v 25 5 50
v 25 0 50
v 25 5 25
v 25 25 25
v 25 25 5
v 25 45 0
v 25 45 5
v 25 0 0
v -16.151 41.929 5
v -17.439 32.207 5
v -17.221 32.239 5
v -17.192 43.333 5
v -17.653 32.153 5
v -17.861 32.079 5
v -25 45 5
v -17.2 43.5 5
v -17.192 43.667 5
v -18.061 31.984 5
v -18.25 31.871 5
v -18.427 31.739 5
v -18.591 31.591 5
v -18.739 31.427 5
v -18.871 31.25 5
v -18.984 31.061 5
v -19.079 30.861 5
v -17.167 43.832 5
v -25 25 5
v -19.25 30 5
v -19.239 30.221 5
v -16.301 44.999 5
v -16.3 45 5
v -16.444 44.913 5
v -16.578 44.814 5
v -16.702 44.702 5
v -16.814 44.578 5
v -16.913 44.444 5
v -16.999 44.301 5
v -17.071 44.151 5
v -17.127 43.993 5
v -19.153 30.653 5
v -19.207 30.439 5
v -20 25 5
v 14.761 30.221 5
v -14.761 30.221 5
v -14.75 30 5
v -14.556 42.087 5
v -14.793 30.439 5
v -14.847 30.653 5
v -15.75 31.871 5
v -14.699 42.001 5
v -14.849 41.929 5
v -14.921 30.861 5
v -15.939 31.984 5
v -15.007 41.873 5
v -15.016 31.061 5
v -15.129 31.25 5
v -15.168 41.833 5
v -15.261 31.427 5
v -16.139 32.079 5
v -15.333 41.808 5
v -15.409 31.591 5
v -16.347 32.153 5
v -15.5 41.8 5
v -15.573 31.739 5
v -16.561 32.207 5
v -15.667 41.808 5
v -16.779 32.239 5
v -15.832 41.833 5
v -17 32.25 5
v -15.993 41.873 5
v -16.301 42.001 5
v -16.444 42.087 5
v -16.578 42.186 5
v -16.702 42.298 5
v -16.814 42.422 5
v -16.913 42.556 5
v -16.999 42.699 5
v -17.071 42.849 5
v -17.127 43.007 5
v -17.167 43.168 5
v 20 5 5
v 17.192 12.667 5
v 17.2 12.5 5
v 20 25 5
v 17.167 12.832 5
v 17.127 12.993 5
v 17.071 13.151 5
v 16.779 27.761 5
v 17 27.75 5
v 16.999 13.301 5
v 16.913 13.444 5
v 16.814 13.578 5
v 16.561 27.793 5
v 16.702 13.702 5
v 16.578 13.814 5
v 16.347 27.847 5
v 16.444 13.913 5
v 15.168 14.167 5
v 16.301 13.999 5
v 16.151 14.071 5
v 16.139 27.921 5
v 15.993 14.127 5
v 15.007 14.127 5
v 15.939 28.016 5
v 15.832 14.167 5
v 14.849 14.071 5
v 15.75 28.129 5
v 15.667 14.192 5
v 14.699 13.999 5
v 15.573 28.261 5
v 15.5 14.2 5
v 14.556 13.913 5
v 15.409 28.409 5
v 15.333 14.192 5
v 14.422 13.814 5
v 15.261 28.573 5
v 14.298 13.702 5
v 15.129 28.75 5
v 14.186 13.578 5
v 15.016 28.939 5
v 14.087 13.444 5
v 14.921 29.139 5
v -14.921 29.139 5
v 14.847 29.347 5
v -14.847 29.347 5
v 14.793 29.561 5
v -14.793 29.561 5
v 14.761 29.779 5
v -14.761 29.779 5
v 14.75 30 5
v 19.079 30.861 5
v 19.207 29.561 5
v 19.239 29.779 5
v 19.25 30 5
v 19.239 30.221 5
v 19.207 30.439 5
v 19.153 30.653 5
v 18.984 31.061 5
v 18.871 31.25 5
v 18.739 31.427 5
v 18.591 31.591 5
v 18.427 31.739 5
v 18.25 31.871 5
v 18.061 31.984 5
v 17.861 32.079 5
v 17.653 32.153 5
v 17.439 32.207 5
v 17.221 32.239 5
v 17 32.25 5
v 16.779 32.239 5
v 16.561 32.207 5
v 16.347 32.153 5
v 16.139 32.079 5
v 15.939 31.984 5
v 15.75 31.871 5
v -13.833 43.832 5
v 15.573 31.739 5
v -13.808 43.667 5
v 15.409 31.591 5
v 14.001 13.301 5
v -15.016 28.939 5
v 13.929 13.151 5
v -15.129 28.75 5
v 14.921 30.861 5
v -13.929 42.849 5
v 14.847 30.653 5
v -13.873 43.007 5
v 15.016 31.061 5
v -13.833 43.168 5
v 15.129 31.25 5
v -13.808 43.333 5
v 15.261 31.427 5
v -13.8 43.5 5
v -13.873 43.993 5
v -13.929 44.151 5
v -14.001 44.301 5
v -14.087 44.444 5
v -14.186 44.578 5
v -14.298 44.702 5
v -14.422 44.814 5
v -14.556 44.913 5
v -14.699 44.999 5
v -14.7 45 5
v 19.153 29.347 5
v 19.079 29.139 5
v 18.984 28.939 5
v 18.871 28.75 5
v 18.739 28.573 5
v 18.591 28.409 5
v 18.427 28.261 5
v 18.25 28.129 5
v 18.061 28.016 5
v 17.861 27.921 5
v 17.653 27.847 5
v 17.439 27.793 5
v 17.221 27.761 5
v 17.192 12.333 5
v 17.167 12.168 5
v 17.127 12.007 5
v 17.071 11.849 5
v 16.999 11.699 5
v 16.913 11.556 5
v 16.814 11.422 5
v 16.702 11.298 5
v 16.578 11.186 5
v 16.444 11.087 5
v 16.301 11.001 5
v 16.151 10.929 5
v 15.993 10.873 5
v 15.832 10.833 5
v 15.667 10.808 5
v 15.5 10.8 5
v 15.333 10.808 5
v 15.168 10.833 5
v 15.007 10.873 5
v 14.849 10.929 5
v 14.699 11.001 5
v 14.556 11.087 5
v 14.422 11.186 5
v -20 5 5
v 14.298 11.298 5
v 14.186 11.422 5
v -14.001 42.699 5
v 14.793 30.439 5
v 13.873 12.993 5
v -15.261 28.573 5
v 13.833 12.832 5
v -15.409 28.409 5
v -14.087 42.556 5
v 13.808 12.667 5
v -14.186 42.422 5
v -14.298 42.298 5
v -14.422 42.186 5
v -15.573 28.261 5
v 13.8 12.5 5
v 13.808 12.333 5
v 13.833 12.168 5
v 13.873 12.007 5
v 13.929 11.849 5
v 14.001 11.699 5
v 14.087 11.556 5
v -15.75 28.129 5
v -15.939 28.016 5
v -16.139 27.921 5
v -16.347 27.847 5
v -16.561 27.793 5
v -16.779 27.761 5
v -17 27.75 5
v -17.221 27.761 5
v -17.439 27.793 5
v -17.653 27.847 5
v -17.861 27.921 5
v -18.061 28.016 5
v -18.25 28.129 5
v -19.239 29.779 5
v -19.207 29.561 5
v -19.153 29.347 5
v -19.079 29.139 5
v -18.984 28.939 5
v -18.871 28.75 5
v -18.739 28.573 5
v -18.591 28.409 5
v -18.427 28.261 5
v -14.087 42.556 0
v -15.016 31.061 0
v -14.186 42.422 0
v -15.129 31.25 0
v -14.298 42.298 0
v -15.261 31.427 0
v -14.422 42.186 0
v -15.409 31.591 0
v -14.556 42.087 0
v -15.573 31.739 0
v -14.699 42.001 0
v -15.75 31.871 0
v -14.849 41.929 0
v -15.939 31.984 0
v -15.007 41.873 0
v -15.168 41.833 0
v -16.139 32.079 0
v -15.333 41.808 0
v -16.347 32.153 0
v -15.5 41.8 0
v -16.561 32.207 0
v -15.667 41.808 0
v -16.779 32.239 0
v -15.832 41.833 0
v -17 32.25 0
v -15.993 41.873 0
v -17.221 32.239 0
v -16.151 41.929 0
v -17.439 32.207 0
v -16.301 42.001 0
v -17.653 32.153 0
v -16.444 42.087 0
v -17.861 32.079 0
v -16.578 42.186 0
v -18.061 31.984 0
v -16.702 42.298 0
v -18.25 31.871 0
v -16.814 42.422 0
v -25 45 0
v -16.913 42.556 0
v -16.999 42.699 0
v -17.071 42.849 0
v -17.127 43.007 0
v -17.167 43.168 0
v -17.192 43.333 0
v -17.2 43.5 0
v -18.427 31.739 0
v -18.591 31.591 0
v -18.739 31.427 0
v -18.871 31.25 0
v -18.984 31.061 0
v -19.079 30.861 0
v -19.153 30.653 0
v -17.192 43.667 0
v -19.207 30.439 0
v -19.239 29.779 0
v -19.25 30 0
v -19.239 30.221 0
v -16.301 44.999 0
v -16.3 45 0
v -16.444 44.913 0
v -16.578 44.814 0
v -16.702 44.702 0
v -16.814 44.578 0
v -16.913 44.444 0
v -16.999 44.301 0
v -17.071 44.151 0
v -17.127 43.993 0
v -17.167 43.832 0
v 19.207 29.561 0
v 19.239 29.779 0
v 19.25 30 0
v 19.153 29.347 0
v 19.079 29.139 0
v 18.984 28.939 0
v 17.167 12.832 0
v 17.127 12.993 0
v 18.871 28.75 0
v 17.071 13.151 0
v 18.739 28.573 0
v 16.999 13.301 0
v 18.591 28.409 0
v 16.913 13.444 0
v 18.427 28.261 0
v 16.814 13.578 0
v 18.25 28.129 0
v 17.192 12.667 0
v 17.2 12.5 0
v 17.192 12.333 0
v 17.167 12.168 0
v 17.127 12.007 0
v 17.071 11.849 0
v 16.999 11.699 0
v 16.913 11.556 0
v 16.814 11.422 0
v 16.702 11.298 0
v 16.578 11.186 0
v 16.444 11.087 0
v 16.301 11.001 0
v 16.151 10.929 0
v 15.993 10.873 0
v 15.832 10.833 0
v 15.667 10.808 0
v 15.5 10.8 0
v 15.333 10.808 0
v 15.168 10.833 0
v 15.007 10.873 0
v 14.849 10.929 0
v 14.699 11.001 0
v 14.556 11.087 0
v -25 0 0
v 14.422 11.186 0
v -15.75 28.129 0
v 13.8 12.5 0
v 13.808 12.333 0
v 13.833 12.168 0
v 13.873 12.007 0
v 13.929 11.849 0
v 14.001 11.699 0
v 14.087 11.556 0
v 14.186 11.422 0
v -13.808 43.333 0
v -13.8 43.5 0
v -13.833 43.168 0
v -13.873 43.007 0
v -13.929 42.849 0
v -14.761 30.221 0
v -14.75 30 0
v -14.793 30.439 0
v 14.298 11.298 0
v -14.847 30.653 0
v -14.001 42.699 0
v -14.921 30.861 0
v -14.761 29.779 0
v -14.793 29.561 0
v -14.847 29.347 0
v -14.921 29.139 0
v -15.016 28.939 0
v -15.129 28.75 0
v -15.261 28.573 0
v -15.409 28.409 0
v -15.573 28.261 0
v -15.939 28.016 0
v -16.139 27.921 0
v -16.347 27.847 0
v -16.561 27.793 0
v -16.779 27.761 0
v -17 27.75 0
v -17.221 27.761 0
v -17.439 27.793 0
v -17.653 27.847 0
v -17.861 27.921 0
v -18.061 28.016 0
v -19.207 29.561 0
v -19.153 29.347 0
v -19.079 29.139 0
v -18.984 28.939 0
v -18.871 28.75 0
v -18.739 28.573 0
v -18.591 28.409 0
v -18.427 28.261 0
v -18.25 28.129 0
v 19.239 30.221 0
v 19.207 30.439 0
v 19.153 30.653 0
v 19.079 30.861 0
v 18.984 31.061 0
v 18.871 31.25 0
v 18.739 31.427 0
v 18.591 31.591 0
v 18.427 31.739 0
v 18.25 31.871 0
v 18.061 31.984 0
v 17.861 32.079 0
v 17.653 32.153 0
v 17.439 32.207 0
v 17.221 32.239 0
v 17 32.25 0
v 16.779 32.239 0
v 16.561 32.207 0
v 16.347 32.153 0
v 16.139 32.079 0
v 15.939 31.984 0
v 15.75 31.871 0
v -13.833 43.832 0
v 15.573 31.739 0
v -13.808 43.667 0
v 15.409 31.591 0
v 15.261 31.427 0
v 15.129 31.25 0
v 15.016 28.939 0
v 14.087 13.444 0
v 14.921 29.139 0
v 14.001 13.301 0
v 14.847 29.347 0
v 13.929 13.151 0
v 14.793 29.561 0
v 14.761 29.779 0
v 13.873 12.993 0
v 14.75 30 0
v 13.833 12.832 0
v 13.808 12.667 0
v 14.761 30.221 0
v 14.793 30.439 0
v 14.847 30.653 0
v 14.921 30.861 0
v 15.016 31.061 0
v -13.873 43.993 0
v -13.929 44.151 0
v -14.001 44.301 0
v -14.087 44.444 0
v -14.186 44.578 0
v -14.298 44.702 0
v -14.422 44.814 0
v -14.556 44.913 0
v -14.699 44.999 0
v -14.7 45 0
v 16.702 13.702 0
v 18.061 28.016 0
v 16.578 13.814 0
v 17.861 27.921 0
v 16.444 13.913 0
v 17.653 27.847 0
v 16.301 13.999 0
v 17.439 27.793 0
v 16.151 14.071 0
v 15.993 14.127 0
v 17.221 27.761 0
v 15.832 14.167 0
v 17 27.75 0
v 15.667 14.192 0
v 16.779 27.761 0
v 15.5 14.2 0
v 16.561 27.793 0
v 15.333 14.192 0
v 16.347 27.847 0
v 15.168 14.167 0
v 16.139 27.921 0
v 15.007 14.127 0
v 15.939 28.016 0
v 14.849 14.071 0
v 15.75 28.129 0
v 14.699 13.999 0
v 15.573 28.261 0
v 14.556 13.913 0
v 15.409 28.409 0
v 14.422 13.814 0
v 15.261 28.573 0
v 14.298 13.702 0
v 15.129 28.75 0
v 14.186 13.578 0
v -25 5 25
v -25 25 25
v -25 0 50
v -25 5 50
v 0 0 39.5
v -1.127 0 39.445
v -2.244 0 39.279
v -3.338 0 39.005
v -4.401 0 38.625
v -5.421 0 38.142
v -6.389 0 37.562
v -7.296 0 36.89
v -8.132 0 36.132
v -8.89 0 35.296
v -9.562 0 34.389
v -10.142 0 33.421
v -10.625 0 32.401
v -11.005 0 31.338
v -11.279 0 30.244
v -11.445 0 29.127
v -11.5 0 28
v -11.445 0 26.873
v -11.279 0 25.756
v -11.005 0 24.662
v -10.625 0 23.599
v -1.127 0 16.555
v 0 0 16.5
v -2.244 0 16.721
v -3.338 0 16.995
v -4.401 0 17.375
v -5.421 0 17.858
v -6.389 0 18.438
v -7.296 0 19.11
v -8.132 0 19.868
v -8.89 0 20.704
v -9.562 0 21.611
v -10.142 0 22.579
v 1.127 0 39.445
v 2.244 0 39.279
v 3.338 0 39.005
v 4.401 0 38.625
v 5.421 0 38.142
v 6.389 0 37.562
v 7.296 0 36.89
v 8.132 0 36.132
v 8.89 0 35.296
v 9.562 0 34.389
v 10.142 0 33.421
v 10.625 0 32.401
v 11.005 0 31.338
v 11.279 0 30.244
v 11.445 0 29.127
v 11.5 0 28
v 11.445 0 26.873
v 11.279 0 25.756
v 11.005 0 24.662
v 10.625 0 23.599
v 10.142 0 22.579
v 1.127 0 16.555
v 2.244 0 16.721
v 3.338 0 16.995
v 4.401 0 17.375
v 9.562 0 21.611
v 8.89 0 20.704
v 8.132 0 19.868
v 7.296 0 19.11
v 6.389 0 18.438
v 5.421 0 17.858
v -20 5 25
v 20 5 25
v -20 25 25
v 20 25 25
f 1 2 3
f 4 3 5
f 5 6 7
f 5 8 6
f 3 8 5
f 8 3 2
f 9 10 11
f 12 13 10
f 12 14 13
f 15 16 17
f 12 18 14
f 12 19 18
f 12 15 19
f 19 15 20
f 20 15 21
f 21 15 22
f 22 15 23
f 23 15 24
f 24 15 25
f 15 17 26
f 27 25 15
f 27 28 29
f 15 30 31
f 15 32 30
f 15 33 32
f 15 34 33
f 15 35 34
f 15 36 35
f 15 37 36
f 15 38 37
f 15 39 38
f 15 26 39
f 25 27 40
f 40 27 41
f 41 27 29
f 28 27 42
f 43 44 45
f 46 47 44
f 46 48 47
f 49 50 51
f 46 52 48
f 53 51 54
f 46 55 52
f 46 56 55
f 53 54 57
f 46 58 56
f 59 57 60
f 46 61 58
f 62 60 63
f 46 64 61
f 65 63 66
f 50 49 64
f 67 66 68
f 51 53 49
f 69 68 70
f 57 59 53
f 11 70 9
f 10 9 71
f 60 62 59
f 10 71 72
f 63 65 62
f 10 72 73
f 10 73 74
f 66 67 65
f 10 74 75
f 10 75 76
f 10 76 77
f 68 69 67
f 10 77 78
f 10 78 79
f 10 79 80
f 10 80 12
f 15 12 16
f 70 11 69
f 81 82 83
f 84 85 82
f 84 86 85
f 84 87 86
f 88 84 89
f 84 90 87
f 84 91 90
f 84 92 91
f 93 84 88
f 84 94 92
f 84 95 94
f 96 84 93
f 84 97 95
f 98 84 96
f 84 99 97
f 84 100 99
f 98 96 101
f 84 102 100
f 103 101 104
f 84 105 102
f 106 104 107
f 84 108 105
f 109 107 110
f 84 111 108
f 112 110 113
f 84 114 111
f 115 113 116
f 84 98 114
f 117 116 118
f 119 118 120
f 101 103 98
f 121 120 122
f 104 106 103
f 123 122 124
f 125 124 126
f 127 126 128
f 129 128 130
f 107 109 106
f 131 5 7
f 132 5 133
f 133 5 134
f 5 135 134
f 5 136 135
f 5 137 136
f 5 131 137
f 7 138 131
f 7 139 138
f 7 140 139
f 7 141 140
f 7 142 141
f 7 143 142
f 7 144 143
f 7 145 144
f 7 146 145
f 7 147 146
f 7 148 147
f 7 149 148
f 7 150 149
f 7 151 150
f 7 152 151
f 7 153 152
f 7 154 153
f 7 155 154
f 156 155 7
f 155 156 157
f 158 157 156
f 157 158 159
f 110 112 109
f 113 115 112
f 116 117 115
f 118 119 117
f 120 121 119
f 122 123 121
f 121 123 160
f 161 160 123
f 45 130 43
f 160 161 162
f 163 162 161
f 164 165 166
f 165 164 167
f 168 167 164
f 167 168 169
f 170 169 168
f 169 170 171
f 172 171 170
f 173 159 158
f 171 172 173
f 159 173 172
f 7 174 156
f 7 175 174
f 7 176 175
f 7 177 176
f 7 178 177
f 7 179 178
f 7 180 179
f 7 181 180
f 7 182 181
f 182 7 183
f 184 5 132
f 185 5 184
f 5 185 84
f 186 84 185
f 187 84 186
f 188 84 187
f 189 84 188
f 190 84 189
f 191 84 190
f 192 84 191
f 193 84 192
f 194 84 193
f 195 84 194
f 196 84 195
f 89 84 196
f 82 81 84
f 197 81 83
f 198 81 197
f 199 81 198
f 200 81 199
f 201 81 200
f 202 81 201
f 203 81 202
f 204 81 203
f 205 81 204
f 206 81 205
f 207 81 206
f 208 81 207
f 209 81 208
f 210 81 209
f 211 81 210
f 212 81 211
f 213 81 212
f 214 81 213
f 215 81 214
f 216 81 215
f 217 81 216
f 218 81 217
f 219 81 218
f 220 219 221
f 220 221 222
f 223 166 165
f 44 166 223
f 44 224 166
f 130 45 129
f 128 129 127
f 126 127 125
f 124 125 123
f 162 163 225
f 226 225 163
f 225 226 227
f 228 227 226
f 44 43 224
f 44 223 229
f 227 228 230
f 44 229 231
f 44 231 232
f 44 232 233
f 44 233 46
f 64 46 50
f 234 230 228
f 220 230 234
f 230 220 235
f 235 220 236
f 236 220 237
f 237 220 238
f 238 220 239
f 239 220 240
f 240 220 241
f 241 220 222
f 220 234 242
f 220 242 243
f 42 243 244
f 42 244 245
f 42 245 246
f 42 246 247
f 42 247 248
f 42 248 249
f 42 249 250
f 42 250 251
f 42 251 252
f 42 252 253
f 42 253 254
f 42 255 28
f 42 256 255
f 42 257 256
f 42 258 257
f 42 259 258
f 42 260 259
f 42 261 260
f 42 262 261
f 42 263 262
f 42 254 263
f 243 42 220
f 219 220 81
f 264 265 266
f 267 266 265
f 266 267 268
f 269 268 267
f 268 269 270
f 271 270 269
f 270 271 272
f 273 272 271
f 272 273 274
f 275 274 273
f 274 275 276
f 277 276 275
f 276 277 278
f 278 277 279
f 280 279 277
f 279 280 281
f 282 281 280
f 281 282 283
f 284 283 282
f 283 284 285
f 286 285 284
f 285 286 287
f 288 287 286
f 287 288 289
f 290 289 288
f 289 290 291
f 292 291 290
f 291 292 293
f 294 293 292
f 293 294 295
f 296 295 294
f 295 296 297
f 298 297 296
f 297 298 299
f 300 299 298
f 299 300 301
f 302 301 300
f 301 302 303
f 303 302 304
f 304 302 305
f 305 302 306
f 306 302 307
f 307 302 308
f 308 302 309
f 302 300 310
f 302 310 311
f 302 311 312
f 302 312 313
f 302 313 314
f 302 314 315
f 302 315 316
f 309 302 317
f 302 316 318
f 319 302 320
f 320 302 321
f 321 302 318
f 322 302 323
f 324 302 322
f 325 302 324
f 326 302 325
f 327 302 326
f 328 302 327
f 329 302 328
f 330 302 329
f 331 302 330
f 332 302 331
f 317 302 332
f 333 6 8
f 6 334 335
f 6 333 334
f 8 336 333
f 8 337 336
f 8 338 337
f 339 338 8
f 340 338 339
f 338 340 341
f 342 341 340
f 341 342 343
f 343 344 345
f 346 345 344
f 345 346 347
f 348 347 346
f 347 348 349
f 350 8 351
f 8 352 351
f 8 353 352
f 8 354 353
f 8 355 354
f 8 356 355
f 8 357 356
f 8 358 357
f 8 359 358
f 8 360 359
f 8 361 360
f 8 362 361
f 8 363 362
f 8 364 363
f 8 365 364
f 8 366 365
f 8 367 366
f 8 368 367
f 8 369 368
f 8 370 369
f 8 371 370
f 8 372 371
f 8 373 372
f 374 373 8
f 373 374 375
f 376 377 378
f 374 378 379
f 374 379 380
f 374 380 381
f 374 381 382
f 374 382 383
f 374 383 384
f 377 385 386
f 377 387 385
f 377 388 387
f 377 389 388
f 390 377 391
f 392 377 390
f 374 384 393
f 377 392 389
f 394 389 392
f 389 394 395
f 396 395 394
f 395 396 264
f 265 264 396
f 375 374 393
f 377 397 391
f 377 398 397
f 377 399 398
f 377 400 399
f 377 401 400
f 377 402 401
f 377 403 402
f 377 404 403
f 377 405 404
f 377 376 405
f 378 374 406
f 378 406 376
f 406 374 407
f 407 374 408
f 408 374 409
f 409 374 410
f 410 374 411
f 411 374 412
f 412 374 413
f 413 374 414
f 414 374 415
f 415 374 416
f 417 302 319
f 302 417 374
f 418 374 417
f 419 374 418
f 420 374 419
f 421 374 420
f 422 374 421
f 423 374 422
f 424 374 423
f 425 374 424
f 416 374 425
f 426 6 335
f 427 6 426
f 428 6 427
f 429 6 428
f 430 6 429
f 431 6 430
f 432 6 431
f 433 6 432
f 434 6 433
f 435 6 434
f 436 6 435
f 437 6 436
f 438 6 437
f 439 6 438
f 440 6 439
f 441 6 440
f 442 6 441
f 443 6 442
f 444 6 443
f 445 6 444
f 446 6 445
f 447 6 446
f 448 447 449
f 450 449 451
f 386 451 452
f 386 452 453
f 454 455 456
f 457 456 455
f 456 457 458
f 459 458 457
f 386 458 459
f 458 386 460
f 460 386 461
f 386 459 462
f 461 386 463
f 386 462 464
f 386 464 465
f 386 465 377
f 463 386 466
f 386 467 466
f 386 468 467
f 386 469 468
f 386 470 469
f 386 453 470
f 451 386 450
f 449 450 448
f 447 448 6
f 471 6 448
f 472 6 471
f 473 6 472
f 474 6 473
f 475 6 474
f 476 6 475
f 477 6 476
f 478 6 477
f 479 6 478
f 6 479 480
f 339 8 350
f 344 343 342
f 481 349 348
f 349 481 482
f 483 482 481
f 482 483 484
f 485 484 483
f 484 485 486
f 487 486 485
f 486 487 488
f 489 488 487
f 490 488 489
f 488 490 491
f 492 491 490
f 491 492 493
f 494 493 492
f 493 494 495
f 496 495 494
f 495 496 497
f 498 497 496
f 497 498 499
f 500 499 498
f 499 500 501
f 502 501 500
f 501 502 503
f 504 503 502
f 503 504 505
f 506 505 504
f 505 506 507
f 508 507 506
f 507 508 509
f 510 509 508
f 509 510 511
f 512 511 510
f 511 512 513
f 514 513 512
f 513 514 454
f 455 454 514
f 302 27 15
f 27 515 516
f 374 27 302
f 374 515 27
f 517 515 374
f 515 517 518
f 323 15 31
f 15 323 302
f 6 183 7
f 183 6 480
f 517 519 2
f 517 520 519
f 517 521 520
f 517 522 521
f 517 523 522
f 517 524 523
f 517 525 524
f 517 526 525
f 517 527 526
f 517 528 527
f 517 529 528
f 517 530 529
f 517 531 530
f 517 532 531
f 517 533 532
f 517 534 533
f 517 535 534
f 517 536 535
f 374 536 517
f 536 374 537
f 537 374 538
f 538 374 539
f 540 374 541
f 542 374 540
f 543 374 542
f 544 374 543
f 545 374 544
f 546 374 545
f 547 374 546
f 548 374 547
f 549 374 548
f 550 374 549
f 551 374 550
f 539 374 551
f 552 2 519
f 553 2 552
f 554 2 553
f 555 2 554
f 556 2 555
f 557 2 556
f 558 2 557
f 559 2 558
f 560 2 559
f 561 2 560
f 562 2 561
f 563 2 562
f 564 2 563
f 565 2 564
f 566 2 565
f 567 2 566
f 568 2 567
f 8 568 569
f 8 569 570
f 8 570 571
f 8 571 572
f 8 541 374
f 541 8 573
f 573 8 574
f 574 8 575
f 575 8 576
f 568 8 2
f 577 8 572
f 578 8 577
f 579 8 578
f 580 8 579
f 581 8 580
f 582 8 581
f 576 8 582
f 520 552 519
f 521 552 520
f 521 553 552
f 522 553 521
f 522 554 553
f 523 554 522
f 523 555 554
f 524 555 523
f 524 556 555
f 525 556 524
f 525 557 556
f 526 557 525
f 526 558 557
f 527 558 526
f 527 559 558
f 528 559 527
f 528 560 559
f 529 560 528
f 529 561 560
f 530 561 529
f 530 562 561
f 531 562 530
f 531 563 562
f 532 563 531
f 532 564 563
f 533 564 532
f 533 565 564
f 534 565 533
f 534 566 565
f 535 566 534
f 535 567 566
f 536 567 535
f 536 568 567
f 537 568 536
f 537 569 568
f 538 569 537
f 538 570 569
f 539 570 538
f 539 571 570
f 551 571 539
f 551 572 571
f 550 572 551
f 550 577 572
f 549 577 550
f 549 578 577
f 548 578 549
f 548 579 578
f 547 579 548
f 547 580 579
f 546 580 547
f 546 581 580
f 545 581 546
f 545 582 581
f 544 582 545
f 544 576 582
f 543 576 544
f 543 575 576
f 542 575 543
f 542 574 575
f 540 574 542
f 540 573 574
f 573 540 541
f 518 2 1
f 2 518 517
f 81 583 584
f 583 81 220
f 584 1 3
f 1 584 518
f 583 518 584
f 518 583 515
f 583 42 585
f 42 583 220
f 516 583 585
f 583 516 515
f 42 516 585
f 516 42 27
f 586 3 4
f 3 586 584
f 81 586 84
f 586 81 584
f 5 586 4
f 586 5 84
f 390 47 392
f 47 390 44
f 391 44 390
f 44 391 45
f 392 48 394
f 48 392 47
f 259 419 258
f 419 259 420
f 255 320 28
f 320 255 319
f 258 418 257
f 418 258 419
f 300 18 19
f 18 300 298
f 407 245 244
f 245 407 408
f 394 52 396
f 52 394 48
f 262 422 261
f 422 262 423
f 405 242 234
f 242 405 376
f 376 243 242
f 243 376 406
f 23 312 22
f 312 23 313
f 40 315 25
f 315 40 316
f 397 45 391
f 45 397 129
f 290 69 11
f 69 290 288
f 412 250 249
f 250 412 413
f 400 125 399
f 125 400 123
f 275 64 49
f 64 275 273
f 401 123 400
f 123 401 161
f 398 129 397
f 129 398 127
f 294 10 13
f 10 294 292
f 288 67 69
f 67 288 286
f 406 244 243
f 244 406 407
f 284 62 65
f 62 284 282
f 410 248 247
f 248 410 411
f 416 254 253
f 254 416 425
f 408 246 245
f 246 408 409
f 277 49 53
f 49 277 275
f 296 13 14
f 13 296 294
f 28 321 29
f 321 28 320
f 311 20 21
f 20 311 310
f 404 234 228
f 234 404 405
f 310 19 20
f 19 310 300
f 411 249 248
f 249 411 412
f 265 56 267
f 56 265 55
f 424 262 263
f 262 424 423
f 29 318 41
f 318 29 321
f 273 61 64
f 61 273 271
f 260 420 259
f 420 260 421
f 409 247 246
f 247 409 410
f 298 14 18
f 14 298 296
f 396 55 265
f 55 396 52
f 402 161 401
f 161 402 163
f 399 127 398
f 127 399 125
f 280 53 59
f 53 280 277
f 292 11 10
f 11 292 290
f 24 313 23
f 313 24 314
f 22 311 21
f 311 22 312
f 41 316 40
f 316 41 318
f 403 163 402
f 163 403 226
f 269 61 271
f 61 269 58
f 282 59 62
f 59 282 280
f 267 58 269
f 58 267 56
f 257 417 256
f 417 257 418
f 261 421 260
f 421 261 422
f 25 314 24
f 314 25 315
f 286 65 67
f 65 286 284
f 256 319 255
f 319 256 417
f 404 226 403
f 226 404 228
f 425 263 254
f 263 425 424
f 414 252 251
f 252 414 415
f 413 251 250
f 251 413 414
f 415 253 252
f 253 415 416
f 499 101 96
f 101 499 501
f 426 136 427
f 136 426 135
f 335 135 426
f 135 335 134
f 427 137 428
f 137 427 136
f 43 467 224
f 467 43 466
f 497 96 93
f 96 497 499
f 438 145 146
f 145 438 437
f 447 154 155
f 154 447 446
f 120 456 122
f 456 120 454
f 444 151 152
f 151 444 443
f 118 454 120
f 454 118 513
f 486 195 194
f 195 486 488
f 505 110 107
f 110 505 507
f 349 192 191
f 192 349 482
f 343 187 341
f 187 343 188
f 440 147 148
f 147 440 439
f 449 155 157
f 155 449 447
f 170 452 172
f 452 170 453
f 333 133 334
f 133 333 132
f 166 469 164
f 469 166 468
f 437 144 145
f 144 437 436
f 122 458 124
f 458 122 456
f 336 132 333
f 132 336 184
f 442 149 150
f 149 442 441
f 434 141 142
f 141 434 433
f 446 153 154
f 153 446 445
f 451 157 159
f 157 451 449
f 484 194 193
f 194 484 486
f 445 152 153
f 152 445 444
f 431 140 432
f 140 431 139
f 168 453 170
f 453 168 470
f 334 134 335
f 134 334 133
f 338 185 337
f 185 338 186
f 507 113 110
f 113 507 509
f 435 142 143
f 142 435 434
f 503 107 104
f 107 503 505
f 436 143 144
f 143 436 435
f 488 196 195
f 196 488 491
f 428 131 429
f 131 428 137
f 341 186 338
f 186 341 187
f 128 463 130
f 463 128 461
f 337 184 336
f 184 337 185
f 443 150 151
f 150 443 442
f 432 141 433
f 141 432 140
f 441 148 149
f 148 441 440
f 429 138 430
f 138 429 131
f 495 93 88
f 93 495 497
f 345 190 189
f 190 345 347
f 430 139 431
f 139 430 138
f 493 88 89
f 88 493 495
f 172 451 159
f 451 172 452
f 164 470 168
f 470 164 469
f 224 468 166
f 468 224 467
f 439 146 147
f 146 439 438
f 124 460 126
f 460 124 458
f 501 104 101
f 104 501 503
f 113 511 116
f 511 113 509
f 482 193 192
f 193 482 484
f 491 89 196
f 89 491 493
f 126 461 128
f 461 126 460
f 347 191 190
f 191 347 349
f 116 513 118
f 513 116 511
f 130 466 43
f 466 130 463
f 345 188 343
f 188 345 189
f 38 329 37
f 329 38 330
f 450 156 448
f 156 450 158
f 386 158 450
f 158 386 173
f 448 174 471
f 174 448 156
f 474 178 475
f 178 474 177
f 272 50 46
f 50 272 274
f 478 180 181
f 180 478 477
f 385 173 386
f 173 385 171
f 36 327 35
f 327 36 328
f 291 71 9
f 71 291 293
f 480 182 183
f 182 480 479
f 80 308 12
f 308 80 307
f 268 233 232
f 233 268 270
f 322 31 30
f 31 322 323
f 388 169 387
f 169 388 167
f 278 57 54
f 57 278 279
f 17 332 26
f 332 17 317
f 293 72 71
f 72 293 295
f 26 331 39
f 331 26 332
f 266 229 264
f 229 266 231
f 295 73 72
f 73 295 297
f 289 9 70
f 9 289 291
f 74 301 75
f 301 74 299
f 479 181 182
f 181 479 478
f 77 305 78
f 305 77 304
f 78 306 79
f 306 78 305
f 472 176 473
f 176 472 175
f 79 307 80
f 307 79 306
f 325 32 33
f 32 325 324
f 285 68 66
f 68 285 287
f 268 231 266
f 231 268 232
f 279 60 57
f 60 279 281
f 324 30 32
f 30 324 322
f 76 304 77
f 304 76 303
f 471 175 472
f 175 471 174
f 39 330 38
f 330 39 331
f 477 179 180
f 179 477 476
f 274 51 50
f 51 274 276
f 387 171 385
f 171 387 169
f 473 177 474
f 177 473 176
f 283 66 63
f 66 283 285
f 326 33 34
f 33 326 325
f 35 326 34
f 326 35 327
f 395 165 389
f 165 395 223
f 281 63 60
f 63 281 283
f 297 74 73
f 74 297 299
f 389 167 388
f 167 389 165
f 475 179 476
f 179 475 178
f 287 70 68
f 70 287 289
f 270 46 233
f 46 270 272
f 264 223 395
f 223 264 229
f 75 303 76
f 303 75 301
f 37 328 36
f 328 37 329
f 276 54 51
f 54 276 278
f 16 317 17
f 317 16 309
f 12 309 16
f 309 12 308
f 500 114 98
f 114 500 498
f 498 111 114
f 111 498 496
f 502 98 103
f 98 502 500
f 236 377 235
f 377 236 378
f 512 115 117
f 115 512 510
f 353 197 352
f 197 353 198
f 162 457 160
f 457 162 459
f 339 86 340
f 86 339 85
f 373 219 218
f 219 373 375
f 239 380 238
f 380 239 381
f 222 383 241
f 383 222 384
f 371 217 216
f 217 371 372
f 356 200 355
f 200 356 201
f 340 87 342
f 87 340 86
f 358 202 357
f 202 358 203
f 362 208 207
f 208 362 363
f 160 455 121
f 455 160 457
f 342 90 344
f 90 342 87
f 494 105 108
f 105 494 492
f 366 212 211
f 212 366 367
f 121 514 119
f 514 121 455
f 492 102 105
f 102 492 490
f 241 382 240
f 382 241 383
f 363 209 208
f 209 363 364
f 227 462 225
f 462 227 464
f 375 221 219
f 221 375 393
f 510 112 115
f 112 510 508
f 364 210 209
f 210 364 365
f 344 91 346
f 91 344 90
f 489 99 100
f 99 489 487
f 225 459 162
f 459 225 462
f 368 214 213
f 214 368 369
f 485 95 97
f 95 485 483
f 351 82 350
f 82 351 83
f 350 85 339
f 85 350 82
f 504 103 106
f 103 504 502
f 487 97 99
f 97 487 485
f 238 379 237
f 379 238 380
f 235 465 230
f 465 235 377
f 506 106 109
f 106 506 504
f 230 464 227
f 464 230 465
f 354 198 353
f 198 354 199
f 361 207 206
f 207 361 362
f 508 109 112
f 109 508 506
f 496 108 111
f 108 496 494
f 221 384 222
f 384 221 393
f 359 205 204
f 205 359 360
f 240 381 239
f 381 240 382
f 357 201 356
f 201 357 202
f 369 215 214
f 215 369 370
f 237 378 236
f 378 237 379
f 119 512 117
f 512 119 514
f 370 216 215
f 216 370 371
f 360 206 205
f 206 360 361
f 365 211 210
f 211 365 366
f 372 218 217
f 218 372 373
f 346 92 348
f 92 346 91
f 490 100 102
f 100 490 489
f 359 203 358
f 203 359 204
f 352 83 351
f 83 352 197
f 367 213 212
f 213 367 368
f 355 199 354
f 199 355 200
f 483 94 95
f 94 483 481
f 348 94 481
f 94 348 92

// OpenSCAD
// L-shaped mounting bracket for NEMA 17 stepper motor
// Print orientation: base plate on bed, motor plate builds upward (+Z)

// ---------------- Parameters ----------------
$fn = 64;

// Base plate
base_x0 = -25;   // base plate X start
base_x1 = 25;    // base plate X end
base_y0 = 0;     // base plate Y start
base_y1 = 45;    // base plate Y end
base_z0 = 0;     // base plate Z start
base_z1 = 5;     // base plate Z end
mount_hole_d = 4.5;  // M4 through-holes diameter
mount_hole_x = [-17, 17]; // through-hole X positions
mount_hole_y = 30;      // through-hole Y position

// Motor plate
motor_x0 = -25;  // motor plate X start
motor_x1 = 25;   // motor plate X end
motor_y0 = 0;    // motor plate Y start
motor_y1 = 5;    // motor plate Y end
motor_z0 = 0;    // motor plate Z start
motor_z1 = 50;   // motor plate Z end

// Boss hole (motor centring)
boss_d = 23;     // boss hole diameter
boss_x = 0;      // boss hole X centre
boss_z = 28;     // boss hole Z centre

// Screw holes for boss
screw_d = 3.4;   // M3 screw diameter
screw_n = 4;     // number of screw holes
screw_s = 31;    // square pattern side length

// Gussets
gusset_t = 5;    // gusset thickness (along X)
gusset_w = 20;   // gusset leg along +Y
gusset_h = 20;   // gusset leg along +Z

// ---------------- Model ----------------
difference() {
    union() {
        // Base plate
        translate([base_x0, base_y0, base_z0])
            cube([base_x1 - base_x0, base_y1 - base_y0, base_z1 - base_z0]);

        // Motor plate
        translate([motor_x0, motor_y0, motor_z0])
            cube([motor_x1 - motor_x0, motor_y1 - motor_y0, motor_z1 - motor_z0]);

        // Left gusset (x = -25 to -20)
        translate([-25, 5, 5])
            cube([gusset_t, gusset_w, gusset_h]);

        // Right gusset (x = 20 to 25)
        translate([20, 5, 5])
            cube([gusset_t, gusset_w, gusset_h]);
    }

    // Base plate through-holes
    for (x = mount_hole_x)
        translate([x, mount_hole_y, -1])
            cylinder(d = mount_hole_d, h = base_z1 + 2);

    // Boss hole
    translate([boss_x, 0, boss_z])
        rotate([90, 0, 0])
            cylinder(d = boss_d, h = motor_y1 - motor_y0 + 2);

    // Screw holes on square pattern
    for (i = [0 : screw_n - 1]) {
        a = (i < 2) ? 0 : 90;
        translate([boss_x + (i < 2 ? -screw_s / 2 : screw_s / 2),
                   boss_z + (i >= 2 ? -screw_s / 2 : screw_s / 2)])
            rotate([0, 0, a])
                cylinder(d = screw_d, h = motor_z1 + 2);
    }
}
